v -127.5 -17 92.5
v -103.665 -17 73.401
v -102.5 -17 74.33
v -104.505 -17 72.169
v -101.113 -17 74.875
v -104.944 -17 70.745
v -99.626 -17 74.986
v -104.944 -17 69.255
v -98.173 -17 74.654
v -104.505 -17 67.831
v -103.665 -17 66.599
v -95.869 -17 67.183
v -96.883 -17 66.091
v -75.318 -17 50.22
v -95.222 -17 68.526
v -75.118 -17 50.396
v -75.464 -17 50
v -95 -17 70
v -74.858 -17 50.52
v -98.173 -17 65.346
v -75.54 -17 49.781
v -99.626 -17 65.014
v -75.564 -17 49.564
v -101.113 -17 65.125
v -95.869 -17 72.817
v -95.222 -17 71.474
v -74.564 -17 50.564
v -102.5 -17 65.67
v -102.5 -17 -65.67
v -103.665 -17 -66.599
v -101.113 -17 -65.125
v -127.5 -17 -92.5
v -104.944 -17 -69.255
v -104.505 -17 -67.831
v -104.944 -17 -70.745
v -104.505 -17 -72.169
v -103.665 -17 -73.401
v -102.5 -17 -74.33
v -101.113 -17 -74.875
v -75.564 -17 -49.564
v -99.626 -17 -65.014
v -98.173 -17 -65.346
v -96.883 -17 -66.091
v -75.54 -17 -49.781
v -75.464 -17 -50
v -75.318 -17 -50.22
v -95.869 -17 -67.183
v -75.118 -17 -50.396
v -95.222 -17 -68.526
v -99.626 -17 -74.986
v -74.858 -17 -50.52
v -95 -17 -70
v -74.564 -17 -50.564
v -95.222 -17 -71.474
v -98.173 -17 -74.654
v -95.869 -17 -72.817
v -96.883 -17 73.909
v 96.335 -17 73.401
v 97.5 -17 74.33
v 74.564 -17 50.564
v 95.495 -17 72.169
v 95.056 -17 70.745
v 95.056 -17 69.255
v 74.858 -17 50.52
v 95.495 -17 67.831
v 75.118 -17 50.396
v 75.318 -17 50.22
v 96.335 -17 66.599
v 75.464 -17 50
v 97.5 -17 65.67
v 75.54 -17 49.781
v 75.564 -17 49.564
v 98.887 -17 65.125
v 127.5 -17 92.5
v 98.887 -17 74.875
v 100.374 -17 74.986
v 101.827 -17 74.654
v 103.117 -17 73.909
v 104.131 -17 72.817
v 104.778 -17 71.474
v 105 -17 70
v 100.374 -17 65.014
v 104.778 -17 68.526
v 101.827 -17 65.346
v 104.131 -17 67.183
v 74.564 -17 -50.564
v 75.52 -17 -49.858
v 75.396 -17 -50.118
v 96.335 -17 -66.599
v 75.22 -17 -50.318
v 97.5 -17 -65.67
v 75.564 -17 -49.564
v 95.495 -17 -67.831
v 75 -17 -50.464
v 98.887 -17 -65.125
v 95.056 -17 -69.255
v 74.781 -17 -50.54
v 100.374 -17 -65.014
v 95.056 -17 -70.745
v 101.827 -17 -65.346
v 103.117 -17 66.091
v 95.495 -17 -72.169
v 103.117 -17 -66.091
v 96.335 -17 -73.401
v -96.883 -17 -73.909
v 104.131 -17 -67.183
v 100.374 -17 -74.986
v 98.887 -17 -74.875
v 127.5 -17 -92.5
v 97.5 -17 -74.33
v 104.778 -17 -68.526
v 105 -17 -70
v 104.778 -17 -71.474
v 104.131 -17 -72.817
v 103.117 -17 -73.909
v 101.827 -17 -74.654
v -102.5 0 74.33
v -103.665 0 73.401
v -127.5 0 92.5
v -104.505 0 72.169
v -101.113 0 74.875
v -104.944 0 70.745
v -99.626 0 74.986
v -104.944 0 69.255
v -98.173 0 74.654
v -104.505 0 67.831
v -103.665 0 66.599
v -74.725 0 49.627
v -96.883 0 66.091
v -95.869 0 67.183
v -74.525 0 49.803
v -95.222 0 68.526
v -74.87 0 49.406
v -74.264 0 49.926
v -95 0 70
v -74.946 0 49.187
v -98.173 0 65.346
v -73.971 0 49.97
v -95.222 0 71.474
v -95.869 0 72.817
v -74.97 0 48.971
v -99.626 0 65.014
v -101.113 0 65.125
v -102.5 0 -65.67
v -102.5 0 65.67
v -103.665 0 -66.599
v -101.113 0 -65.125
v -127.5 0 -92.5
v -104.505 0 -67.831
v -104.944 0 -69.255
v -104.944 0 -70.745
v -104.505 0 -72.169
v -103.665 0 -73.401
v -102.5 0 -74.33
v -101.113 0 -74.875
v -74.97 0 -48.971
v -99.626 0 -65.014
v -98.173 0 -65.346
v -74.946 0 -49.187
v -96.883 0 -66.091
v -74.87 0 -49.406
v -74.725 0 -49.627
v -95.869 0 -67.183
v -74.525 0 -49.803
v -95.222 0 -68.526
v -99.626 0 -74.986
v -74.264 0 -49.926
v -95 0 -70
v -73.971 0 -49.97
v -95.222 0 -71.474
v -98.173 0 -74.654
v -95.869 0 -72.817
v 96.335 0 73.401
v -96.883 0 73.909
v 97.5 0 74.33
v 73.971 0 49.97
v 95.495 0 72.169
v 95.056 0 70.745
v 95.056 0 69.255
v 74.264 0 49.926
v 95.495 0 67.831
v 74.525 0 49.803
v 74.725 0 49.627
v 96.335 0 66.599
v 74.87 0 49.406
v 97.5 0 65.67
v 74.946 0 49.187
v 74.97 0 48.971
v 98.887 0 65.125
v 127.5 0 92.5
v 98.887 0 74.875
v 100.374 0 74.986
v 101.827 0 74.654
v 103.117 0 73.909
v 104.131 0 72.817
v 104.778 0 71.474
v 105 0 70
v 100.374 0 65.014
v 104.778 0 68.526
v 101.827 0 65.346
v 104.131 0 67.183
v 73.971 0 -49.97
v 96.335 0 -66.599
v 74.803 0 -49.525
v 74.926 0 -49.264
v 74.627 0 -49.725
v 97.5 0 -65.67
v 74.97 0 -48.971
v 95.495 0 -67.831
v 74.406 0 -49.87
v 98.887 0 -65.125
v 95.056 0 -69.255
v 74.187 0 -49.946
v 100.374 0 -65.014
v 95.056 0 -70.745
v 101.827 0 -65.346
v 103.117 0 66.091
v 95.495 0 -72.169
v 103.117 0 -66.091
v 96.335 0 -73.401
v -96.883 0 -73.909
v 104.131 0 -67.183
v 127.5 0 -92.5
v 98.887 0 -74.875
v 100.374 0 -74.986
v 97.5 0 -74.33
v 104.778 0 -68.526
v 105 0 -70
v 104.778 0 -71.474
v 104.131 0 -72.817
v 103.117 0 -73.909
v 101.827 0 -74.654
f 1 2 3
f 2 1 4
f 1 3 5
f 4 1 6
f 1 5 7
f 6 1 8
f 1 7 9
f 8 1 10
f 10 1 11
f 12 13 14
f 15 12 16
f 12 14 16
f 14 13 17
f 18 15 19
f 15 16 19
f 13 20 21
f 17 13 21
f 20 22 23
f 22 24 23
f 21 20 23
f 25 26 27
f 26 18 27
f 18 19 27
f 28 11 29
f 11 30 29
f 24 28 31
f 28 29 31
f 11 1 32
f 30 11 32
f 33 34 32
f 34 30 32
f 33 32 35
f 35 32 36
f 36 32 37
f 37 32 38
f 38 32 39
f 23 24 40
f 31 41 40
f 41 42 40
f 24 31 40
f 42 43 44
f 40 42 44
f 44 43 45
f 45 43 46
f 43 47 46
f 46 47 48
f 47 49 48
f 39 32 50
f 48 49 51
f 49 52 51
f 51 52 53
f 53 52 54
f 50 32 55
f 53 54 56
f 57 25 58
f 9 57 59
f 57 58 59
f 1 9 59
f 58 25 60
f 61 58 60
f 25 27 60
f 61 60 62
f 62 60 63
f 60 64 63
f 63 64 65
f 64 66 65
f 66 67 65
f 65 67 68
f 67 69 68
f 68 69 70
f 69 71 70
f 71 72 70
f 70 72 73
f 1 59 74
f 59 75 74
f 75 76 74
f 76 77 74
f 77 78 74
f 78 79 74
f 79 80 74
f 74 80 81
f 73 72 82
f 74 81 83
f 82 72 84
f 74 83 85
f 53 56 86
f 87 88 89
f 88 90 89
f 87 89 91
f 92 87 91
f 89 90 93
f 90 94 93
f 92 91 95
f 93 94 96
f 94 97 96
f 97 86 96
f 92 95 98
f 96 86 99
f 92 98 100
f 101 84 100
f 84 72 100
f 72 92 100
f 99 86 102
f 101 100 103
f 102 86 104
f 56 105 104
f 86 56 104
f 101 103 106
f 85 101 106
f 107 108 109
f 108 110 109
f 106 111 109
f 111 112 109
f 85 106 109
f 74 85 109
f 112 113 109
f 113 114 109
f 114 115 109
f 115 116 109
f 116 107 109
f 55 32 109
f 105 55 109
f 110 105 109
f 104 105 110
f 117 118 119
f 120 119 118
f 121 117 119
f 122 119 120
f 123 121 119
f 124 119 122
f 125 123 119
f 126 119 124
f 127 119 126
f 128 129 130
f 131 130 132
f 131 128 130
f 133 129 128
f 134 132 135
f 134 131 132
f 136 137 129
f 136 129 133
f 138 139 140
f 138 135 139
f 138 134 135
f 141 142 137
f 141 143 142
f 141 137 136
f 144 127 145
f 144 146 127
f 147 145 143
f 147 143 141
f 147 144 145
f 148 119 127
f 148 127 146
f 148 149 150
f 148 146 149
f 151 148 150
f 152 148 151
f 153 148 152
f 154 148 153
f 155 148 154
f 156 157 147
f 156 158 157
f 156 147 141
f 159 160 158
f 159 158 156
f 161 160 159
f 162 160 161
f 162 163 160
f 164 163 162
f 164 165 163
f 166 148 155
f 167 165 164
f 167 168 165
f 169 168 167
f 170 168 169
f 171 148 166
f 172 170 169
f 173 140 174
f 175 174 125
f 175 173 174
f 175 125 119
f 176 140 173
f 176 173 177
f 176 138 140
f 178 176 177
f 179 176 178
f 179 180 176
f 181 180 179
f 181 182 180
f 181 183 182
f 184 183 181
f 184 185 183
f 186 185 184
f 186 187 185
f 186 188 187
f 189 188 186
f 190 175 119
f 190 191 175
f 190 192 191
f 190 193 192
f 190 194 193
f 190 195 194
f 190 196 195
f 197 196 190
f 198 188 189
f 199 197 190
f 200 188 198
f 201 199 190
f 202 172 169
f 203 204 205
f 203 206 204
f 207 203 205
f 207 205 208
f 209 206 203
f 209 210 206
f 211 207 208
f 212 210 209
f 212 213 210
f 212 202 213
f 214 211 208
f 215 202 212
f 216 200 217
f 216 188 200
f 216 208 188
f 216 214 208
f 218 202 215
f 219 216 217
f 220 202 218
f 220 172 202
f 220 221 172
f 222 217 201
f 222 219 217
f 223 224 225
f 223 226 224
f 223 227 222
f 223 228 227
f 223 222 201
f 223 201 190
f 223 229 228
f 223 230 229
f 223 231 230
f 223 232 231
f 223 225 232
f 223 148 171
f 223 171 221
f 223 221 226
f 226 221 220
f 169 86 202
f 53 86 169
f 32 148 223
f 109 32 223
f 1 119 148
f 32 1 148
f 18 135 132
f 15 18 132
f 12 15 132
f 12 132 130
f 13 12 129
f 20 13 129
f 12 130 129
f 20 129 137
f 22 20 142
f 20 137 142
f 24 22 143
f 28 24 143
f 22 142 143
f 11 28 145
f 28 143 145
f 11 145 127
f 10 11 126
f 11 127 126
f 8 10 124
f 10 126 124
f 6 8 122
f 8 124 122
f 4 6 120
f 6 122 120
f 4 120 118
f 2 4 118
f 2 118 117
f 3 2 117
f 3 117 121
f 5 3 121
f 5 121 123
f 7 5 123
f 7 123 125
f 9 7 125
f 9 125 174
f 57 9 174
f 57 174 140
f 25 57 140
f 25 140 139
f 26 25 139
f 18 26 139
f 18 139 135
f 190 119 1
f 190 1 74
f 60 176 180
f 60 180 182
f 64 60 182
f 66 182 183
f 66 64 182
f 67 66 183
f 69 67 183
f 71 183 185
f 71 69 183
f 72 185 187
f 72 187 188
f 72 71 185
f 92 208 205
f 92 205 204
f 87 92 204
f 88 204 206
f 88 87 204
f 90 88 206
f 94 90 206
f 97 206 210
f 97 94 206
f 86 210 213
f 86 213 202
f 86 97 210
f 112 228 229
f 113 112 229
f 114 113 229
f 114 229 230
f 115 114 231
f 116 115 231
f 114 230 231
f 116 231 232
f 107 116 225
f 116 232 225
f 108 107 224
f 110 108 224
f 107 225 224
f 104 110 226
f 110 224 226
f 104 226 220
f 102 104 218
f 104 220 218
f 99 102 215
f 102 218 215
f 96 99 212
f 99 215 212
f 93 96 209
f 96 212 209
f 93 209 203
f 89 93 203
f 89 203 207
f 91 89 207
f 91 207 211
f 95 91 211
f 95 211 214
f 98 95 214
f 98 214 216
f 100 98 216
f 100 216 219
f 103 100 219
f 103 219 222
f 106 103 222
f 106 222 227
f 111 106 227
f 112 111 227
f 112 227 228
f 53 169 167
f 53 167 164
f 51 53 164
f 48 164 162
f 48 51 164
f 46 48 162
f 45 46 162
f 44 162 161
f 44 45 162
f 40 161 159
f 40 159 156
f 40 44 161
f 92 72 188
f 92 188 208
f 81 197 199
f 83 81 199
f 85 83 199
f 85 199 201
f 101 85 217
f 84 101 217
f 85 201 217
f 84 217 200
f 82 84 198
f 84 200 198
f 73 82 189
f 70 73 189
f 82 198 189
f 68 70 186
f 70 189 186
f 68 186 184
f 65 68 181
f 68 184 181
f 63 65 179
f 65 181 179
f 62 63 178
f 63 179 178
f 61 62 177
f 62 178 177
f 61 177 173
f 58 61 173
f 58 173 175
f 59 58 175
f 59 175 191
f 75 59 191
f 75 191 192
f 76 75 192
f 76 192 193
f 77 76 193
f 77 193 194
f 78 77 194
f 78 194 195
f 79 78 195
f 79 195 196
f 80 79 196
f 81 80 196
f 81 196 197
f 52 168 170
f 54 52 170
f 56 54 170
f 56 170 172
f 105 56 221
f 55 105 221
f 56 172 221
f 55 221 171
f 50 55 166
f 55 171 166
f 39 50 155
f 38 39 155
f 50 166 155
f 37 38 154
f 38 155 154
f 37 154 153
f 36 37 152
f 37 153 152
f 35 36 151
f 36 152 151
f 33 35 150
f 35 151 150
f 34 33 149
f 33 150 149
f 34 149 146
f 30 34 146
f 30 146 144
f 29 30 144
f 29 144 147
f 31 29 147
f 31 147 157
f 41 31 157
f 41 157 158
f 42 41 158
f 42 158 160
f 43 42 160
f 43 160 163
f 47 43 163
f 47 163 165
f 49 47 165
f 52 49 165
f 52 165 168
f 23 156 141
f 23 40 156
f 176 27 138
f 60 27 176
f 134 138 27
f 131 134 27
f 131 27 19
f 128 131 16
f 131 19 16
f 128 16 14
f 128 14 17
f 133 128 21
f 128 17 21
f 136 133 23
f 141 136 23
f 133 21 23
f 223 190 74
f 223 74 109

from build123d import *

# Parameters (mm, degrees)
SKETCH1_W           = 255
SKETCH1_H           = 185
BOSS_EXTRUDE1_DEPTH = 17
SKETCH2_W           = 149.94
SKETCH2_H           = 99.94
CUT_EXTRUDE1_DEPTH  = 19.5
CUT_EXTRUDE1_TAPER  = -2
FILLET1_R           = 1
SKETCH3_R           = 5
CUT_EXTRUDE2_DEPTH  = 19.5


with BuildPart() as part:
    # Sketch1 → Boss-Extrude1 (new body)
    with BuildSketch(Plane(origin=(0, 0, 0), x_dir=(1, 0, 0), z_dir=(0, 1, 0))):
        Rectangle(SKETCH1_W, SKETCH1_H)
    extrude(amount=-BOSS_EXTRUDE1_DEPTH)

    # Sketch2 → Cut-Extrude1 (cut)
    with BuildSketch(Plane(origin=(0, 0, 0), x_dir=(1, 0, 0), z_dir=(0, 1, 0))):
        Rectangle(SKETCH2_W, SKETCH2_H)
    extrude(amount=-CUT_EXTRUDE1_DEPTH, taper=CUT_EXTRUDE1_TAPER, mode=Mode.SUBTRACT)

    # Fillet1
    fillet1_edges = [part.edges().sort_by_distance(p)[0] for p in [
        (-75.266826541, -8.5, 50.266826541),
        (-75.266826541, -8.5, -50.266826541),
        (75.266826541, -8.5, -50.266826541),
        (75.266826541, -8.5, 50.266826541),
    ]]
    fillet(fillet1_edges, radius=FILLET1_R)

    # Sketch3 → Cut-Extrude2 (cut)
    with BuildSketch(Plane(origin=(0, 0, 0), x_dir=(1, 0, 0), z_dir=(0, 1, 0))):
        with Locations((-100, 70)):
            Circle(SKETCH3_R)
        with Locations((100, 70)):
            Circle(SKETCH3_R)
        with Locations((100, -70)):
            Circle(SKETCH3_R)
        with Locations((-100, -70)):
            Circle(SKETCH3_R)
    extrude(amount=-CUT_EXTRUDE2_DEPTH, mode=Mode.SUBTRACT)


solid = part.part
